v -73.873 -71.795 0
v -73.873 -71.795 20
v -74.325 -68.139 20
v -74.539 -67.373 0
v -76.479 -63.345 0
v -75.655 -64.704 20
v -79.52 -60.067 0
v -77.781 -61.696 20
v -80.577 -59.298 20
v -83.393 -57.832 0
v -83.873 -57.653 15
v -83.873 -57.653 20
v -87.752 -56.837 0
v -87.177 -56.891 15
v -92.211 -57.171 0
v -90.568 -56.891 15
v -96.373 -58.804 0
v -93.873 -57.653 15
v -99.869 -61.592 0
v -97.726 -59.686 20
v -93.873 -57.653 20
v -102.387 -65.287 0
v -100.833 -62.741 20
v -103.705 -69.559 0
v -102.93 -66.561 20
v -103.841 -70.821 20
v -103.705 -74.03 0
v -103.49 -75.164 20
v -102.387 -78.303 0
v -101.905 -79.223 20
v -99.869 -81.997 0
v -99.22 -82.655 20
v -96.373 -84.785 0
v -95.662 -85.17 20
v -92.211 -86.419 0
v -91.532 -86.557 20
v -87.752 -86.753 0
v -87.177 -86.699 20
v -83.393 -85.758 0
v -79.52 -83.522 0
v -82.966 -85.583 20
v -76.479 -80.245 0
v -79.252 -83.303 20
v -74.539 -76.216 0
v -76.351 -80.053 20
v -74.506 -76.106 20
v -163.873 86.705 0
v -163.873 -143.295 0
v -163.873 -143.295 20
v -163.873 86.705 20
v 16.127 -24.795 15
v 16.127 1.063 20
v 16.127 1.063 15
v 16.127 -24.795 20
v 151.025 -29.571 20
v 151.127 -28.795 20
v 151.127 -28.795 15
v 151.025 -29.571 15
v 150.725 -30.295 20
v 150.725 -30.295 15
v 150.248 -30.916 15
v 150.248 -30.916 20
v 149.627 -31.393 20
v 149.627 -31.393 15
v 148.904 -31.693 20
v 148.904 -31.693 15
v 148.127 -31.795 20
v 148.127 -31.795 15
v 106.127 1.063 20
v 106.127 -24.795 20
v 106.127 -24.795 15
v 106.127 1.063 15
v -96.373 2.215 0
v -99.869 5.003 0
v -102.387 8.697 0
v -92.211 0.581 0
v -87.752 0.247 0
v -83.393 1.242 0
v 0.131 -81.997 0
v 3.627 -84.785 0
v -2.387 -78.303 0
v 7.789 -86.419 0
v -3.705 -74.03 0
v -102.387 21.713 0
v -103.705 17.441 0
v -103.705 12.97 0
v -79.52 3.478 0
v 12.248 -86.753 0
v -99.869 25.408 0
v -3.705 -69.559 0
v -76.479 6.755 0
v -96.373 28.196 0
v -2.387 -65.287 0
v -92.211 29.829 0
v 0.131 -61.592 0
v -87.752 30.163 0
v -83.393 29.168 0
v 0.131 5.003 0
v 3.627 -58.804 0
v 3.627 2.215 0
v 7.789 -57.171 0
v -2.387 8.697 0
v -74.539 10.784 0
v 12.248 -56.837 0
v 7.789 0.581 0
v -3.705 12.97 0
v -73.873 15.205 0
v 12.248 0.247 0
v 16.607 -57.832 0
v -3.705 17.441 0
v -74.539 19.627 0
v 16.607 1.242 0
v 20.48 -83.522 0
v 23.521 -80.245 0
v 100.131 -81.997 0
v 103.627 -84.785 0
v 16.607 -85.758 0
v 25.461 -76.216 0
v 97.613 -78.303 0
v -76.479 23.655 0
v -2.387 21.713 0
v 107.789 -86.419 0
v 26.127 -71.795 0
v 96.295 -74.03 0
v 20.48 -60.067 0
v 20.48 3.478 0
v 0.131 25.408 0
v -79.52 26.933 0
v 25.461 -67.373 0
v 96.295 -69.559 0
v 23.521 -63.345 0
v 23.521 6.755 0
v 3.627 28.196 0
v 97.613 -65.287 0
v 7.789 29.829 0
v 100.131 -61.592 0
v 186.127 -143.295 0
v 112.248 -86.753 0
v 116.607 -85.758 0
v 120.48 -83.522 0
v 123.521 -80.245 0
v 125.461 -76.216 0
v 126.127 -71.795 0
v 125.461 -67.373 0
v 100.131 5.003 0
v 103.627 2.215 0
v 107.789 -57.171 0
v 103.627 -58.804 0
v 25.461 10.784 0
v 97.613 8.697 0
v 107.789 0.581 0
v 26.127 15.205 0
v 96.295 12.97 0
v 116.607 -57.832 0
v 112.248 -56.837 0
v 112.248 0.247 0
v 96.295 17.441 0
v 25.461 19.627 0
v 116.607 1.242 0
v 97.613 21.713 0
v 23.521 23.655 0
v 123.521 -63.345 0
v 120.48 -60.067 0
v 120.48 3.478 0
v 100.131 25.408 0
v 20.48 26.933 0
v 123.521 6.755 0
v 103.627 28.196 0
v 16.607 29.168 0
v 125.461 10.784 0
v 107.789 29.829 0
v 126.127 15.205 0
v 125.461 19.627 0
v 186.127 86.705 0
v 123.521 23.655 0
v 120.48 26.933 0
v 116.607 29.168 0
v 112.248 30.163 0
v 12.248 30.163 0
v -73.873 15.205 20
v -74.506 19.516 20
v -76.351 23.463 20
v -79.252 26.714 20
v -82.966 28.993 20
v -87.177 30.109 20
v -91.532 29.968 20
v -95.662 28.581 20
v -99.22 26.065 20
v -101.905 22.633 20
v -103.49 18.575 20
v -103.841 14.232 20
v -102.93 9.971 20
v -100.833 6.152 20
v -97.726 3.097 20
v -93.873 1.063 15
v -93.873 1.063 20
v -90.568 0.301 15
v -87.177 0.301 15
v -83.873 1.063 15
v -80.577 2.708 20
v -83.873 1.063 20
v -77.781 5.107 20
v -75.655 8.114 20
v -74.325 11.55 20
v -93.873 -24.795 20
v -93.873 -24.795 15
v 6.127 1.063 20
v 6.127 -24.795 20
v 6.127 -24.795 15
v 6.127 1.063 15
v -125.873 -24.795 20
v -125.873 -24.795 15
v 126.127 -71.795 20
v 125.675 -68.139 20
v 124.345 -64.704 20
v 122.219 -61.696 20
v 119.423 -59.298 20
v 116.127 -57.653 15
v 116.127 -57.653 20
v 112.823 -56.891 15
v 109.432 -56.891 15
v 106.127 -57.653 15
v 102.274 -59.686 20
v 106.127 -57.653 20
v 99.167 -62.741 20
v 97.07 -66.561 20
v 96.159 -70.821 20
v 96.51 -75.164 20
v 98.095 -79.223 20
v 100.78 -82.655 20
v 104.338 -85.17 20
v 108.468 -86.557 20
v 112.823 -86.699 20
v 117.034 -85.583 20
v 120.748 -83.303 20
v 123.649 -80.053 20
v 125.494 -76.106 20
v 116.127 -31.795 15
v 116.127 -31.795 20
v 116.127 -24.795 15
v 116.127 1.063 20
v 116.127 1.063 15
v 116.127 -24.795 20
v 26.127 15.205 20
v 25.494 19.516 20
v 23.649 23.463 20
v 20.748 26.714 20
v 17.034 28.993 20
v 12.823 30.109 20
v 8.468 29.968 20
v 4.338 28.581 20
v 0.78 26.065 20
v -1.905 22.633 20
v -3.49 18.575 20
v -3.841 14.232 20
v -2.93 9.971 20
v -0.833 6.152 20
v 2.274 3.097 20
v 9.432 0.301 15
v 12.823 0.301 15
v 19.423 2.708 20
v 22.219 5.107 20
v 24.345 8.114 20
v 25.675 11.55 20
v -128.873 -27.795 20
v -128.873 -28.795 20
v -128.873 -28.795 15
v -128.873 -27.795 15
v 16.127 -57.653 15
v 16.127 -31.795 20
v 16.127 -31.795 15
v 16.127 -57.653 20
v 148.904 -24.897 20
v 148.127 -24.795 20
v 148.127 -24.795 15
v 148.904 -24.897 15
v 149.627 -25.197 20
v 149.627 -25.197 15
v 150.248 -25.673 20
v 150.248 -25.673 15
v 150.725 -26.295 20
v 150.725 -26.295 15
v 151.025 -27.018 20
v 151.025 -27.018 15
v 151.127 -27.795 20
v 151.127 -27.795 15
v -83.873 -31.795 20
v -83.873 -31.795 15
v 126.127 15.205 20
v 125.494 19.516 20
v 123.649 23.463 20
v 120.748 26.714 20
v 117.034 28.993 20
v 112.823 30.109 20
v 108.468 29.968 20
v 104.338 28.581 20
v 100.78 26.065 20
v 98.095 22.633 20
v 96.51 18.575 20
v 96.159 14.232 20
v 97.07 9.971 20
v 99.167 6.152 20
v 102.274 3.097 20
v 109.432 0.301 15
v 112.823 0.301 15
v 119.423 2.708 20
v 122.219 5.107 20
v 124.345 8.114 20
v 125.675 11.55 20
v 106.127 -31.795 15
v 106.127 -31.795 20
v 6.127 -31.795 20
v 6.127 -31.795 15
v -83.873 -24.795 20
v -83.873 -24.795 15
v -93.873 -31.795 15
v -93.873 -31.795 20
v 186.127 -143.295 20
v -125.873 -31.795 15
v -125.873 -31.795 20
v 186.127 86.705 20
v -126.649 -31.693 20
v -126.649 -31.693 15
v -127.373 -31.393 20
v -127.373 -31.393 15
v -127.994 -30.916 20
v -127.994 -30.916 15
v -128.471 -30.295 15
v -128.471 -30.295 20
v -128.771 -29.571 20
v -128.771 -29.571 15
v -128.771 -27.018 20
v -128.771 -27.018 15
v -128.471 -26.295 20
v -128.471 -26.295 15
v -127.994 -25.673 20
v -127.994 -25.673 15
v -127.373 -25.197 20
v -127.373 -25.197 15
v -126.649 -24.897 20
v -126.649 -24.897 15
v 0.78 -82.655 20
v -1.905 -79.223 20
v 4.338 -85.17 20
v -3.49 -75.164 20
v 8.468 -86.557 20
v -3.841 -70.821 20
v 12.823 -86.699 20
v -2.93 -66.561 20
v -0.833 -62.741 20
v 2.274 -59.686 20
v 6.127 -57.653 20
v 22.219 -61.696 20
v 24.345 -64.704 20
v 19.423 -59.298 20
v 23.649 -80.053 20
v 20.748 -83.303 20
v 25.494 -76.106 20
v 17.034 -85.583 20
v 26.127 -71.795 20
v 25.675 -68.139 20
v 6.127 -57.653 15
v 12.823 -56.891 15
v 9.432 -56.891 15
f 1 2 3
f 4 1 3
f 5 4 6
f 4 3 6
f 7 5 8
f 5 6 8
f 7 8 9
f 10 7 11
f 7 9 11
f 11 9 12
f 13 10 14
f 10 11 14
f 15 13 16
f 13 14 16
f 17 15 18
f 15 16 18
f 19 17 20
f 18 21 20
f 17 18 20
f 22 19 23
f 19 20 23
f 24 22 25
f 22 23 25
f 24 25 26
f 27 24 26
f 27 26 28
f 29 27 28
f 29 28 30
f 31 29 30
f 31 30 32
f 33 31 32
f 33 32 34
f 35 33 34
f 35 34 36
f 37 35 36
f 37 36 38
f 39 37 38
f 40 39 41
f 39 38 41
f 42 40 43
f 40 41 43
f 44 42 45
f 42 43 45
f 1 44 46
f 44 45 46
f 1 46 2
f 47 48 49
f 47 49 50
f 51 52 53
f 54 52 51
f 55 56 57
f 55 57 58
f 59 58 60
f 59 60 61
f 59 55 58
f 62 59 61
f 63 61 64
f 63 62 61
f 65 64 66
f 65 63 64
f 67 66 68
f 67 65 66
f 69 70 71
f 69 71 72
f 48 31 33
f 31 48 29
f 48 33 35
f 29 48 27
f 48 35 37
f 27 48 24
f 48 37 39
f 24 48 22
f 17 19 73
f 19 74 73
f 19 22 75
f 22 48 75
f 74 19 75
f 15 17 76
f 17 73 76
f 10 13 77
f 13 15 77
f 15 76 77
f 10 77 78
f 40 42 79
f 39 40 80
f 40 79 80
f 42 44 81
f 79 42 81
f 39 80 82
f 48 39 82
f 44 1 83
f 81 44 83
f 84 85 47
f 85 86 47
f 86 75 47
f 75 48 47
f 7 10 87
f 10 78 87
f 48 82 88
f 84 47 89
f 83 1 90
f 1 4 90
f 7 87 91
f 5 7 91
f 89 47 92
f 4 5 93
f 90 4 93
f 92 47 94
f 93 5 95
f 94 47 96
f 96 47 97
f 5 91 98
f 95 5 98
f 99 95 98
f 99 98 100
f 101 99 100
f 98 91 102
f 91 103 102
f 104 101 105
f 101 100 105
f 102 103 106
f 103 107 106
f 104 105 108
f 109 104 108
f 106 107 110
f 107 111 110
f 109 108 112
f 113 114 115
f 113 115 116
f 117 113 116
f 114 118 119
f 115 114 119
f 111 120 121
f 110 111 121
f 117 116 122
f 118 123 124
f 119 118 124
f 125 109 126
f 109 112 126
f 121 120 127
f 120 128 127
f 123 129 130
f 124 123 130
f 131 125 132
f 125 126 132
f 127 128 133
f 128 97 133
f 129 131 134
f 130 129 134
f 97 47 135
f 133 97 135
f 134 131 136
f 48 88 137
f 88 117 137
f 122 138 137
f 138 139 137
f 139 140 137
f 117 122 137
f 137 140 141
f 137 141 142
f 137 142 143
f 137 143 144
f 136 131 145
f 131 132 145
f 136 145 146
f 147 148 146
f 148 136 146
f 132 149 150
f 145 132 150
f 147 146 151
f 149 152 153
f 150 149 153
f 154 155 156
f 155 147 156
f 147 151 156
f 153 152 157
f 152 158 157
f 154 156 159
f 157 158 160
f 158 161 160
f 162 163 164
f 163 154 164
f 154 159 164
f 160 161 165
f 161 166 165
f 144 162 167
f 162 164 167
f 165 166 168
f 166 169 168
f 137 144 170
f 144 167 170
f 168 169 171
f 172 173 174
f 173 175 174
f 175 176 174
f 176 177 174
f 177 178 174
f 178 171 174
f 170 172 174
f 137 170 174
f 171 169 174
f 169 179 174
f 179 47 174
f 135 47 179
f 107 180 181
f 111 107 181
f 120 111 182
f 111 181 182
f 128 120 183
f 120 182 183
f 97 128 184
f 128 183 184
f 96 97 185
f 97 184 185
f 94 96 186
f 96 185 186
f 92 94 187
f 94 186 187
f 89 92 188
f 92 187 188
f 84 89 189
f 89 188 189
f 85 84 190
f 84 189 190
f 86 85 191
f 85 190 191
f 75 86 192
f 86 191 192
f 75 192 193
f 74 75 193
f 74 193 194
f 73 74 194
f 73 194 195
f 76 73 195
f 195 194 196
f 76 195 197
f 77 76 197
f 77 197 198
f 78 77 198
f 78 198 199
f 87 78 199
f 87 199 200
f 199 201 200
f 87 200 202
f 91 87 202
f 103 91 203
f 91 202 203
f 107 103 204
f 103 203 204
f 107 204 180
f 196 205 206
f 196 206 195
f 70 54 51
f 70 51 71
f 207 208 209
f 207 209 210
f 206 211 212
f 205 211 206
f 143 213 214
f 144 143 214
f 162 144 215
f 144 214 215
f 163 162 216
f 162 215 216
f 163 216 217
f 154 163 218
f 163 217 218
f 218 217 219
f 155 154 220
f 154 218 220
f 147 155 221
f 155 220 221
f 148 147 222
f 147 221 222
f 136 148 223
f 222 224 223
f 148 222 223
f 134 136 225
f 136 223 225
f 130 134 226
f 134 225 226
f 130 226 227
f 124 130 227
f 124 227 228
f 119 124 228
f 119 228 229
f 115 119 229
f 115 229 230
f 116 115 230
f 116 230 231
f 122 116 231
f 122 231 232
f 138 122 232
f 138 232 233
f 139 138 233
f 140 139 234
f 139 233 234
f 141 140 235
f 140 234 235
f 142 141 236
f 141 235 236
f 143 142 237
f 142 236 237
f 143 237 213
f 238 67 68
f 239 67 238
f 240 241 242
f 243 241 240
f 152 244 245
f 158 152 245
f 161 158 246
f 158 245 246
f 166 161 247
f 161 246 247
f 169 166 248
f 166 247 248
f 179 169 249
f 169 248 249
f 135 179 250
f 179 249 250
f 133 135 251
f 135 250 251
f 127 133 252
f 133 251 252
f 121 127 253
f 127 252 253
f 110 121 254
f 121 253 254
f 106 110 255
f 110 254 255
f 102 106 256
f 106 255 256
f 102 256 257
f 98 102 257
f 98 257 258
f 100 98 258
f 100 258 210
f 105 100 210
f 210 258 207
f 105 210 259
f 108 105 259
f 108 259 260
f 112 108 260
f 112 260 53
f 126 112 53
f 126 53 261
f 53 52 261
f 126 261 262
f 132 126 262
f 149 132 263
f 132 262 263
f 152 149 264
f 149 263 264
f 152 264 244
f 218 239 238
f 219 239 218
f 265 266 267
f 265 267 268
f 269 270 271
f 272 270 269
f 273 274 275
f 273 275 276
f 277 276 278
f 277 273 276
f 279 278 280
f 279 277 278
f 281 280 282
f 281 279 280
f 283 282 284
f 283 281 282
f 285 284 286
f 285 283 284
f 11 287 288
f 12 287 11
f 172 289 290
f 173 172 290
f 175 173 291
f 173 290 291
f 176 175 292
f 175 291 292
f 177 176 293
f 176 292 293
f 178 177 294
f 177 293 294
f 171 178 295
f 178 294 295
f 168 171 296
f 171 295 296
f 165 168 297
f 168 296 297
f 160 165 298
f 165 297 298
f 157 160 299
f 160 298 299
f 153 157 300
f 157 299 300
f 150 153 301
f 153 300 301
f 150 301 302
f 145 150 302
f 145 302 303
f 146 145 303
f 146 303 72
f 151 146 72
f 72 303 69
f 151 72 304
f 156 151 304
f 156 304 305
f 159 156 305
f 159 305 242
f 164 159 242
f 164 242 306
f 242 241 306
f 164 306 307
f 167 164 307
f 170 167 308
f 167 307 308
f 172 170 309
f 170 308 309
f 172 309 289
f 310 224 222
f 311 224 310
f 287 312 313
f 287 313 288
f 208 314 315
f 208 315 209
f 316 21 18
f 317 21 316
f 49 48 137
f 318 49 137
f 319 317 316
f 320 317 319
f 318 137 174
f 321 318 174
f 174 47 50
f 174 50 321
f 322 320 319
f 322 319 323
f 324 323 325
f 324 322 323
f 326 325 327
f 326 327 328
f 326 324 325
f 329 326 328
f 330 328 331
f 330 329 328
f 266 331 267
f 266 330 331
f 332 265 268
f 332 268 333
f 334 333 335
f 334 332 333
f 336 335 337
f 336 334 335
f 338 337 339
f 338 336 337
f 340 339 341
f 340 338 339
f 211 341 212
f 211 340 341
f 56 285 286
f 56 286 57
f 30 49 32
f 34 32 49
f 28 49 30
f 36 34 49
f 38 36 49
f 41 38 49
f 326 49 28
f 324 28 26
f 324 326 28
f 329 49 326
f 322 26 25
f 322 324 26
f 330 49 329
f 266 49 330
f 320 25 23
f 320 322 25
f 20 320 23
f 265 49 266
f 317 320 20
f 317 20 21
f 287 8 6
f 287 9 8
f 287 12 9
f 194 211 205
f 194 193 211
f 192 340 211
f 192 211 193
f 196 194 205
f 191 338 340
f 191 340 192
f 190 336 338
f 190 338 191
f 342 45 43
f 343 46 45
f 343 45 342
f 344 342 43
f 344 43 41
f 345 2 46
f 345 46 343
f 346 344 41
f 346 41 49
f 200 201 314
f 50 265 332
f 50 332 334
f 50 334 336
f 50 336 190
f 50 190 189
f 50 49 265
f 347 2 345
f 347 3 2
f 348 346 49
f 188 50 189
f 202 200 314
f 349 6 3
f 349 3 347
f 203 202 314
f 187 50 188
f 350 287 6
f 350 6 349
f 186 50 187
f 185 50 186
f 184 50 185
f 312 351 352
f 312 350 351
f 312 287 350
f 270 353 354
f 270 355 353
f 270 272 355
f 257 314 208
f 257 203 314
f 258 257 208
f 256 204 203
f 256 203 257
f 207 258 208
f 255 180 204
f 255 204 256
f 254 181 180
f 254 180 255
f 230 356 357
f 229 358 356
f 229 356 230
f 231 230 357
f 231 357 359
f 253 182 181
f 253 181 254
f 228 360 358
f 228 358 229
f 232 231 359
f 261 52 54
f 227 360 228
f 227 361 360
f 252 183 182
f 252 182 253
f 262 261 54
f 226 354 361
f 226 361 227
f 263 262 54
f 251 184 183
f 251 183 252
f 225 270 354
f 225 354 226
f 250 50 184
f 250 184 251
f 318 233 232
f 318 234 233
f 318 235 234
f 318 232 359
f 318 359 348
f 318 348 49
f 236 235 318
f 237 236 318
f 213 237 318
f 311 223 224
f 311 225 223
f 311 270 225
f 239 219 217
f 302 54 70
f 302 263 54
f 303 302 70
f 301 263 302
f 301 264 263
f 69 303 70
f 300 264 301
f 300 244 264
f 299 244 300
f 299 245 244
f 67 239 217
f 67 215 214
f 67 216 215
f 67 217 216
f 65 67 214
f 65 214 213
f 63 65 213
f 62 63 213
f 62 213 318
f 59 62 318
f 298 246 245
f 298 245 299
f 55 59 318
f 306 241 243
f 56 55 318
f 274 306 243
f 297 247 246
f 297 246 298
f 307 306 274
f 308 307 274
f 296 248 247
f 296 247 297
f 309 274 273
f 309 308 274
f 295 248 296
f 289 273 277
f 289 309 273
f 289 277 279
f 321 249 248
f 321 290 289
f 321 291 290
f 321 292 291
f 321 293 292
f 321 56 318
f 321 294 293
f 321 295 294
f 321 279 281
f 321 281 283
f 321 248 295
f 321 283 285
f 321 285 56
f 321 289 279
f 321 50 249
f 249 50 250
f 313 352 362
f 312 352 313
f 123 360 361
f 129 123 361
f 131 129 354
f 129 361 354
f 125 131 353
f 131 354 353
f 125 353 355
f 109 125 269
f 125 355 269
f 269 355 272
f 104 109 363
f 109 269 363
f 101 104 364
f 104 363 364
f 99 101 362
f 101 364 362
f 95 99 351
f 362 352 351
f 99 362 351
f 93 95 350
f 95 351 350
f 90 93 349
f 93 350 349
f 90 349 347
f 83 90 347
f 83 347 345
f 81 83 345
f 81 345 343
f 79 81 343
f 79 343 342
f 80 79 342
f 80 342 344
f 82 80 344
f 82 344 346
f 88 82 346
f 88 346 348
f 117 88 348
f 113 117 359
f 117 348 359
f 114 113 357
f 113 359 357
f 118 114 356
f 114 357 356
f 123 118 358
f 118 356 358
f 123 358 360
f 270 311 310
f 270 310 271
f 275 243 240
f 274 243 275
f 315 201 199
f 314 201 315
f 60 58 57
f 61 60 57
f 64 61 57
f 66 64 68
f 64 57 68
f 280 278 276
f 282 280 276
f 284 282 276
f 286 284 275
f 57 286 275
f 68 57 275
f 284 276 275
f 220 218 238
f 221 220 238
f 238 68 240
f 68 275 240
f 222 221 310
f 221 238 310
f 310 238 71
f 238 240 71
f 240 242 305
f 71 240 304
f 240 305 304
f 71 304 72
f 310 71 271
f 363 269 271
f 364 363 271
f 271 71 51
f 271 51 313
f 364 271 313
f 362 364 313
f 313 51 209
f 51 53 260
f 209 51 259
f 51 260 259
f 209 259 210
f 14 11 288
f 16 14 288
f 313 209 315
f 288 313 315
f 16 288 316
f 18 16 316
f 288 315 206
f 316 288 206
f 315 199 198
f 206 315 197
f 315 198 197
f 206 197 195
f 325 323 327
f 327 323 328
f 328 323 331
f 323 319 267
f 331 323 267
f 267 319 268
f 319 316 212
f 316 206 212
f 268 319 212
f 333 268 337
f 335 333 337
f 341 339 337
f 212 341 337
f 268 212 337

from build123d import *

# Parameters (mm, degrees)
SKETCH1_W           = 350
SKETCH1_H           = 230
BOSS_EXTRUDE1_DEPTH = 20
CUT_EXTRUDE1_DEPTH  = 5
SKETCH4_R           = 15
CUT_EXTRUDE2_DEPTH  = 20


with BuildPart() as part:
    # Sketch1 → Boss-Extrude1 (new body)
    with BuildSketch(Plane.XY):
        with Locations((11.12716763, -28.294797688)):
            Rectangle(SKETCH1_W, SKETCH1_H)
    extrude(amount=BOSS_EXTRUDE1_DEPTH)

    # Sketch3 → Cut-Extrude1 (cut)
    with BuildSketch(Plane.XY.offset(20)):
        with BuildLine():
            Line((-125.87283237, -24.794797688), (-93.87283237, -24.794797688))
            Line((-93.87283237, -24.794797688), (-93.87283237, 5.205202312))
            Line((-93.87283237, 5.205202312), (-83.87283237, 5.205202312))
            Line((-83.87283237, 5.205202312), (-83.87283237, -24.794797688))
            Line((-83.87283237, -24.794797688), (6.12716763, -24.794797688))
            Line((6.12716763, -24.794797688), (6.12716763, 5.205202312))
            Line((6.12716763, 5.205202312), (16.12716763, 5.205202312))
            Line((16.12716763, 5.205202312), (16.12716763, -24.794797688))
            Line((16.12716763, -24.794797688), (106.12716763, -24.794797688))
            Line((106.12716763, -24.794797688), (106.12716763, 5.205202312))
            Line((106.12716763, 5.205202312), (116.12716763, 5.205202312))
            Line((116.12716763, 5.205202312), (116.12716763, -24.794797688))
            Line((116.12716763, -24.794797688), (148.12716763, -24.794797688))
            ThreePointArc((148.12716763, -24.794797688), (150.248487974, -25.673477344), (151.12716763, -27.794797688))
            Line((151.12716763, -27.794797688), (151.12716763, -28.794797688))
            ThreePointArc((151.12716763, -28.794797688), (150.248487974, -30.916118031), (148.12716763, -31.794797688))
            Line((148.12716763, -31.794797688), (116.12716763, -31.794797688))
            Line((116.12716763, -31.794797688), (116.12716763, -61.794797688))
            Line((116.12716763, -61.794797688), (106.12716763, -61.794797688))
            Line((106.12716763, -61.794797688), (106.12716763, -31.794797688))
            Line((106.12716763, -31.794797688), (16.12716763, -31.794797688))
            Line((16.12716763, -31.794797688), (16.12716763, -61.794797688))
            Line((16.12716763, -61.794797688), (6.12716763, -61.794797688))
            Line((6.12716763, -61.794797688), (6.12716763, -31.794797688))
            Line((6.12716763, -31.794797688), (-83.87283237, -31.794797688))
            Line((-83.87283237, -31.794797688), (-83.87283237, -61.794797688))
            Line((-83.87283237, -61.794797688), (-93.87283237, -61.794797688))
            Line((-93.87283237, -61.794797688), (-93.87283237, -31.794797688))
            Line((-93.87283237, -31.794797688), (-125.87283237, -31.794797688))
            ThreePointArc((-125.87283237, -31.794797688), (-127.994152714, -30.916118031), (-128.87283237, -28.794797688))
            Line((-128.87283237, -28.794797688), (-128.87283237, -27.794797688))
            ThreePointArc((-128.87283237, -27.794797688), (-127.994152714, -25.673477344), (-125.87283237, -24.794797688))
        make_face()
    extrude(amount=-CUT_EXTRUDE1_DEPTH, mode=Mode.SUBTRACT)

    # Sketch4 → Cut-Extrude2 (cut)
    with BuildSketch(Plane.XY.offset(20)):
        with Locations((111.12716763, 15.205202312)):
            Circle(SKETCH4_R)
        with Locations((11.12716763, 15.205202312)):
            Circle(SKETCH4_R)
        with Locations((-88.87283237, 15.205202312)):
            Circle(SKETCH4_R)
        with Locations((111.12716763, -71.794797688)):
            Circle(SKETCH4_R)
        with Locations((11.12716763, -71.794797688)):
            Circle(SKETCH4_R)
        with Locations((-88.87283237, -71.794797688)):
            Circle(SKETCH4_R)
    extrude(amount=-CUT_EXTRUDE2_DEPTH, mode=Mode.SUBTRACT)


solid = part.part
